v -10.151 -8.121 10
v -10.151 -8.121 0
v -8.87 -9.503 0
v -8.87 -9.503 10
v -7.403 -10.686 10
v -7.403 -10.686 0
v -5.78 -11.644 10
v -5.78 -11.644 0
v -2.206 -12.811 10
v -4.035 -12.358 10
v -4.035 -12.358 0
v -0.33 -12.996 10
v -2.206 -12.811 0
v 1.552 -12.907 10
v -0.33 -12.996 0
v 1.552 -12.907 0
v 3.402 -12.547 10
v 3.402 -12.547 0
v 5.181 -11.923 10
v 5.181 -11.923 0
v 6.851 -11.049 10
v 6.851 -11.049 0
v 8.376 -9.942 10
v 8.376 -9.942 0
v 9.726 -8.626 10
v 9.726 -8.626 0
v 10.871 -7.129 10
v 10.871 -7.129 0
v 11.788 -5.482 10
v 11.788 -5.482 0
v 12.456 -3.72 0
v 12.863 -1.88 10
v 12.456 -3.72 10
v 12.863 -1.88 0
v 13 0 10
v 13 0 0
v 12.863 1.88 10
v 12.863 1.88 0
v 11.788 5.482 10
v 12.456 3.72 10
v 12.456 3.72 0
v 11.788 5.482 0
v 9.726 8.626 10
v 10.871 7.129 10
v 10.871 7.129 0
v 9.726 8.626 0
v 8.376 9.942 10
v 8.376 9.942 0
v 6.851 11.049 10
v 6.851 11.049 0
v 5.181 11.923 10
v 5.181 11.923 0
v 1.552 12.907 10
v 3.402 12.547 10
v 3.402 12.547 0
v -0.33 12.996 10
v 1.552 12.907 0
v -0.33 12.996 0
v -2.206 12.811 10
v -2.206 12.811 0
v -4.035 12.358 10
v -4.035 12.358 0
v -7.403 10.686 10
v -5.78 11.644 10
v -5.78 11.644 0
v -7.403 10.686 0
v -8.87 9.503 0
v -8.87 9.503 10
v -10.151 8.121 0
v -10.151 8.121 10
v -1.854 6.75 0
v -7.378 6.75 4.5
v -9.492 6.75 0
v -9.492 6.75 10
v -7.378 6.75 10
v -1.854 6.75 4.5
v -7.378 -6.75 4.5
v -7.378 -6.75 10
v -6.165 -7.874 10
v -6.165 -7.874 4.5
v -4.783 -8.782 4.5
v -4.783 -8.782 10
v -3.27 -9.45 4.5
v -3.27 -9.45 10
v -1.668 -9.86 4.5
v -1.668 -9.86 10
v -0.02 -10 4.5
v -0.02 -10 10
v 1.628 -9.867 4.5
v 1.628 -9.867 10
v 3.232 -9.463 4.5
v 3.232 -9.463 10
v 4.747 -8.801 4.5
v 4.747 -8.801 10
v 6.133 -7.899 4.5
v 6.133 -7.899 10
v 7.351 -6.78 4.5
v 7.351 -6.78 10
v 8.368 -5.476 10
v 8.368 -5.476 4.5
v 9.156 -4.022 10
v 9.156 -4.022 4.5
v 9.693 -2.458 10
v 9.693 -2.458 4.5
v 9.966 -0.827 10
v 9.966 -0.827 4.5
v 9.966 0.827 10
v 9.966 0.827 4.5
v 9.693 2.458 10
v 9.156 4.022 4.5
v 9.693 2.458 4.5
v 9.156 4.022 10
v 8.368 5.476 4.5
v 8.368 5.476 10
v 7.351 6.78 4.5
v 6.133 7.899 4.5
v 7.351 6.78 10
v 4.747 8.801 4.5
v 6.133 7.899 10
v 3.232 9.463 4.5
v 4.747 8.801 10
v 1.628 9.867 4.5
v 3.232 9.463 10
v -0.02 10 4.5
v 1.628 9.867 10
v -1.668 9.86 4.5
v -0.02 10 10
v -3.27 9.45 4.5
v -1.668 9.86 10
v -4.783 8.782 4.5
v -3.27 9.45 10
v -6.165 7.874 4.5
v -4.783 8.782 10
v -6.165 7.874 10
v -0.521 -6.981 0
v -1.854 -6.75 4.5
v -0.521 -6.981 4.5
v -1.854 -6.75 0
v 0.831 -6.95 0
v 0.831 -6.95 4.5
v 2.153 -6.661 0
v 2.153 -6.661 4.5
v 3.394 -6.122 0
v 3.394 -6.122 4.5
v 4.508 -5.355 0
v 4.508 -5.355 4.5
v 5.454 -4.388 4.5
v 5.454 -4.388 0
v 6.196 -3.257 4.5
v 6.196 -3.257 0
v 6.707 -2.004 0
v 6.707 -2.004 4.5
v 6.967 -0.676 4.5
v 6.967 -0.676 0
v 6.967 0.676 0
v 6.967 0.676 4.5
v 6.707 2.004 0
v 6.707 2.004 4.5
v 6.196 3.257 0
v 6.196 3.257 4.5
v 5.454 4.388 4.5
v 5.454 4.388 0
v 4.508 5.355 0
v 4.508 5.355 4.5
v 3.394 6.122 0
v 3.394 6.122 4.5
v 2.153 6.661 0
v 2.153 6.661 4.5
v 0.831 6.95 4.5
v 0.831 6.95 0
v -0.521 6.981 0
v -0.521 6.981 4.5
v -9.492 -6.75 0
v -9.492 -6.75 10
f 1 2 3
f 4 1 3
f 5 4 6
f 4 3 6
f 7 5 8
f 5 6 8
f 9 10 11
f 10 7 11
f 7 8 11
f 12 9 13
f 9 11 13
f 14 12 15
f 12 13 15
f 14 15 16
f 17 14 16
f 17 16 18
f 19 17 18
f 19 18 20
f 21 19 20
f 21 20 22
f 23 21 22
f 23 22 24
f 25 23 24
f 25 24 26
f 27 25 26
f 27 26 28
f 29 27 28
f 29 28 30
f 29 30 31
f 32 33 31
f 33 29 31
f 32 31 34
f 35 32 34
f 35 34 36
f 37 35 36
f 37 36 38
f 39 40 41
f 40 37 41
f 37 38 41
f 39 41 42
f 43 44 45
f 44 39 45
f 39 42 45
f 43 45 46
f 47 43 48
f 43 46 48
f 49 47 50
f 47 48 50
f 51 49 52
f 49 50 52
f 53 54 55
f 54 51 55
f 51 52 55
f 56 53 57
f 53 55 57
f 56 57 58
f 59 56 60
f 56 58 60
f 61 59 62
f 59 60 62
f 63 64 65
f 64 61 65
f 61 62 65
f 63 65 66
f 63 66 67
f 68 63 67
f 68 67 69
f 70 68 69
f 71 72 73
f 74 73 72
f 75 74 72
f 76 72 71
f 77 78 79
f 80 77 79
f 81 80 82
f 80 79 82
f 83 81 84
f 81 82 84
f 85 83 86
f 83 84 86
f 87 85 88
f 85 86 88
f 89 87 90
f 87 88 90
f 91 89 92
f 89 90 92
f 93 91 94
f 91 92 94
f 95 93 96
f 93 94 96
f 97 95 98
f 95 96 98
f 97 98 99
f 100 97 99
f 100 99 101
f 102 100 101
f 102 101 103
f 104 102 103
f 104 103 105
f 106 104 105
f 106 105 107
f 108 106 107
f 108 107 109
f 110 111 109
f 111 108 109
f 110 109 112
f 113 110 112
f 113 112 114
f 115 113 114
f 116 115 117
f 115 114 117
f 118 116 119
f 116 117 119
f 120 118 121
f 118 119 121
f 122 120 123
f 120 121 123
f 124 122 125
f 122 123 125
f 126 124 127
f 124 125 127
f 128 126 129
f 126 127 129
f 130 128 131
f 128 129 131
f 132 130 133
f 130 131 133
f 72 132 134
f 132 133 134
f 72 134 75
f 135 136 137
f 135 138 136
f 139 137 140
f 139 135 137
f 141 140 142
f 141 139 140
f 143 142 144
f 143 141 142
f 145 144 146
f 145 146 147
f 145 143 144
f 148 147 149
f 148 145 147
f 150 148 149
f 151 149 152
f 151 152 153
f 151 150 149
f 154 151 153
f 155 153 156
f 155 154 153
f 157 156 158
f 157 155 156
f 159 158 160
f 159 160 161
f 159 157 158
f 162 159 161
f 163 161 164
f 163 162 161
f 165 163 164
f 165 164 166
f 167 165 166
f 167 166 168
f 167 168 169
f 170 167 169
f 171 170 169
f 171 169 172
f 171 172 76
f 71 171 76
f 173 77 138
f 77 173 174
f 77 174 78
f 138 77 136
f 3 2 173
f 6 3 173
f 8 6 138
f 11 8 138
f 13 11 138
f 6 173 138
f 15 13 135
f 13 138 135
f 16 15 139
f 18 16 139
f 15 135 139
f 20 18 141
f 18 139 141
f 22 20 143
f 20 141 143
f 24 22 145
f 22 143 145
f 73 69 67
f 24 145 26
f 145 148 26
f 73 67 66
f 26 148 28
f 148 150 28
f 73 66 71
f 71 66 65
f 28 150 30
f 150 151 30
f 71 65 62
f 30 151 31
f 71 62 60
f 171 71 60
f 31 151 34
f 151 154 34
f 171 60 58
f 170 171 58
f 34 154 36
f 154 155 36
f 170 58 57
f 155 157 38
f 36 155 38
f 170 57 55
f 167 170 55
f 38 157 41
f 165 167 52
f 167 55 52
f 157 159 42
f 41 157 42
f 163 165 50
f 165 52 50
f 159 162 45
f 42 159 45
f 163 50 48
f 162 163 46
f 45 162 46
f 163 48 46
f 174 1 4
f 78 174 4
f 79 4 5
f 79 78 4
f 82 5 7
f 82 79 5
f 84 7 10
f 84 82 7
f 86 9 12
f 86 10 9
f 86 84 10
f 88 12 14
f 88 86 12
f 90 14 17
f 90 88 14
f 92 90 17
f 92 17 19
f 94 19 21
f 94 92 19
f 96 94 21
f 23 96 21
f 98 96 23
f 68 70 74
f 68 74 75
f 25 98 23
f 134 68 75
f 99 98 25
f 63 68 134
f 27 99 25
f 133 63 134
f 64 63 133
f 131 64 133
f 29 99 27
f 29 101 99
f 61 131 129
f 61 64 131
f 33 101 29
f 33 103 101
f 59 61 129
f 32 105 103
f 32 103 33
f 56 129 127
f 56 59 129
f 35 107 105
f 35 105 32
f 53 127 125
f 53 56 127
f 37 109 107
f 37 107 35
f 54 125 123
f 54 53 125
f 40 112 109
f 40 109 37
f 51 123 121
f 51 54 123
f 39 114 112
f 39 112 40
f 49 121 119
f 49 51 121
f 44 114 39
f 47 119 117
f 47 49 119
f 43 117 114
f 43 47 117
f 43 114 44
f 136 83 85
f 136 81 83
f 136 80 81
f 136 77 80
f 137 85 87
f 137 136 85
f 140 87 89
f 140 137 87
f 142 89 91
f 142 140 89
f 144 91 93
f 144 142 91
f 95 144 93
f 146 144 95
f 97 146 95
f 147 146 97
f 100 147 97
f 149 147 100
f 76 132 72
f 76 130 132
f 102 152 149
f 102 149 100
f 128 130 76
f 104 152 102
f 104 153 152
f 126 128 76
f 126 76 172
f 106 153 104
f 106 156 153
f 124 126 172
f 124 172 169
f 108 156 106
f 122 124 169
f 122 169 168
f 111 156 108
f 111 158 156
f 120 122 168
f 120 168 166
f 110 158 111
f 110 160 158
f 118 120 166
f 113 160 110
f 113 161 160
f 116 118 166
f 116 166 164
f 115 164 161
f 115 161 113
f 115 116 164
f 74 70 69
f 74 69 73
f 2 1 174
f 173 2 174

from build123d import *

# Parameters (mm, degrees)
F0_R        = 13
F0_R_2      = 7
F1_DEPTH    = 10
F2_R        = 10
F2_R_2      = 7
F3_DEPTH    = 5.5
F4_W        = 13.5
F4_H        = 13.5
F5_DEPTH    = 10.001
F6_T1_DEPTH = 18.5160584479


# Not quite as in the source:
# - a fillet or chamfer that OpenCascade refuses, or shapes differently, is made with other operations: its cross-section is extruded or revolved along the edge and cut away or added


with BuildPart() as f1:
    # F0 (on Top) → F1 (new body)
    with BuildSketch(Plane.XY):
        Circle(F0_R)
        Circle(F0_R_2, mode=Mode.SUBTRACT)
    extrude(amount=F1_DEPTH)

    # F2 (on face) → F3 (cut)
    with BuildSketch(Plane.XY.offset(10)):
        Circle(F2_R)
        Circle(F2_R_2, mode=Mode.SUBTRACT)
    extrude(amount=-F3_DEPTH, mode=Mode.SUBTRACT)

    # F4 (on face) → F5 (cut, through all)
    with BuildSketch(Plane.XY.offset(10)):
        with Locations((-6.75, 0)):
            Rectangle(F4_W, F4_H)
    extrude(amount=-F5_DEPTH, mode=Mode.SUBTRACT)

    # F6: chamfer of 1.5 on 2 edges, made by hand

    # F6_s2 → F6_t1 (cut)
    with BuildSketch(Plane.XY.offset(-4.2580292239)):
        with BuildLine():
            Line((-10.1773648706, 8.1750152332), (-9.4664670488, 6.6959219319))
            Line((-9.4664670488, 6.6959219319), (-9.4664670488, 6.6659219319))
            ThreePointArc((-9.4664670488, 6.6659219319), (-10.2883550352, 6.72), (-11.1102430216, 6.72))
            Line((-11.1102430216, 6.72), (-11.135882044, 6.7655769231))
            ThreePointArc((-11.135882044, 6.7655769231), (-10.669011075, 7.4801806583), (-10.2007911166, 8.1937558574))
            Line((-10.2007911166, 8.1937558574), (-10.1773648706, 8.1750152332))
        make_face()
        with BuildLine():
            Line((-10.1773648706, -8.1750152332), (-9.4664670488, -6.6959219319))
            Line((-9.4664670488, -6.6959219319), (-9.4664670488, -6.6659219319))
            ThreePointArc((-9.4664670488, -6.6659219319), (-10.2883550352, -6.72), (-11.1102430216, -6.72))
            Line((-11.1102430216, -6.72), (-11.135882044, -6.7655769231))
            ThreePointArc((-11.135882044, -6.7655769231), (-10.669011075, -7.4801806583), (-10.2007911166, -8.1937558574))
            Line((-10.2007911166, -8.1937558574), (-10.1773648706, -8.1750152332))
        make_face()
    extrude(amount=F6_T1_DEPTH, mode=Mode.SUBTRACT)


solid = f1.part
